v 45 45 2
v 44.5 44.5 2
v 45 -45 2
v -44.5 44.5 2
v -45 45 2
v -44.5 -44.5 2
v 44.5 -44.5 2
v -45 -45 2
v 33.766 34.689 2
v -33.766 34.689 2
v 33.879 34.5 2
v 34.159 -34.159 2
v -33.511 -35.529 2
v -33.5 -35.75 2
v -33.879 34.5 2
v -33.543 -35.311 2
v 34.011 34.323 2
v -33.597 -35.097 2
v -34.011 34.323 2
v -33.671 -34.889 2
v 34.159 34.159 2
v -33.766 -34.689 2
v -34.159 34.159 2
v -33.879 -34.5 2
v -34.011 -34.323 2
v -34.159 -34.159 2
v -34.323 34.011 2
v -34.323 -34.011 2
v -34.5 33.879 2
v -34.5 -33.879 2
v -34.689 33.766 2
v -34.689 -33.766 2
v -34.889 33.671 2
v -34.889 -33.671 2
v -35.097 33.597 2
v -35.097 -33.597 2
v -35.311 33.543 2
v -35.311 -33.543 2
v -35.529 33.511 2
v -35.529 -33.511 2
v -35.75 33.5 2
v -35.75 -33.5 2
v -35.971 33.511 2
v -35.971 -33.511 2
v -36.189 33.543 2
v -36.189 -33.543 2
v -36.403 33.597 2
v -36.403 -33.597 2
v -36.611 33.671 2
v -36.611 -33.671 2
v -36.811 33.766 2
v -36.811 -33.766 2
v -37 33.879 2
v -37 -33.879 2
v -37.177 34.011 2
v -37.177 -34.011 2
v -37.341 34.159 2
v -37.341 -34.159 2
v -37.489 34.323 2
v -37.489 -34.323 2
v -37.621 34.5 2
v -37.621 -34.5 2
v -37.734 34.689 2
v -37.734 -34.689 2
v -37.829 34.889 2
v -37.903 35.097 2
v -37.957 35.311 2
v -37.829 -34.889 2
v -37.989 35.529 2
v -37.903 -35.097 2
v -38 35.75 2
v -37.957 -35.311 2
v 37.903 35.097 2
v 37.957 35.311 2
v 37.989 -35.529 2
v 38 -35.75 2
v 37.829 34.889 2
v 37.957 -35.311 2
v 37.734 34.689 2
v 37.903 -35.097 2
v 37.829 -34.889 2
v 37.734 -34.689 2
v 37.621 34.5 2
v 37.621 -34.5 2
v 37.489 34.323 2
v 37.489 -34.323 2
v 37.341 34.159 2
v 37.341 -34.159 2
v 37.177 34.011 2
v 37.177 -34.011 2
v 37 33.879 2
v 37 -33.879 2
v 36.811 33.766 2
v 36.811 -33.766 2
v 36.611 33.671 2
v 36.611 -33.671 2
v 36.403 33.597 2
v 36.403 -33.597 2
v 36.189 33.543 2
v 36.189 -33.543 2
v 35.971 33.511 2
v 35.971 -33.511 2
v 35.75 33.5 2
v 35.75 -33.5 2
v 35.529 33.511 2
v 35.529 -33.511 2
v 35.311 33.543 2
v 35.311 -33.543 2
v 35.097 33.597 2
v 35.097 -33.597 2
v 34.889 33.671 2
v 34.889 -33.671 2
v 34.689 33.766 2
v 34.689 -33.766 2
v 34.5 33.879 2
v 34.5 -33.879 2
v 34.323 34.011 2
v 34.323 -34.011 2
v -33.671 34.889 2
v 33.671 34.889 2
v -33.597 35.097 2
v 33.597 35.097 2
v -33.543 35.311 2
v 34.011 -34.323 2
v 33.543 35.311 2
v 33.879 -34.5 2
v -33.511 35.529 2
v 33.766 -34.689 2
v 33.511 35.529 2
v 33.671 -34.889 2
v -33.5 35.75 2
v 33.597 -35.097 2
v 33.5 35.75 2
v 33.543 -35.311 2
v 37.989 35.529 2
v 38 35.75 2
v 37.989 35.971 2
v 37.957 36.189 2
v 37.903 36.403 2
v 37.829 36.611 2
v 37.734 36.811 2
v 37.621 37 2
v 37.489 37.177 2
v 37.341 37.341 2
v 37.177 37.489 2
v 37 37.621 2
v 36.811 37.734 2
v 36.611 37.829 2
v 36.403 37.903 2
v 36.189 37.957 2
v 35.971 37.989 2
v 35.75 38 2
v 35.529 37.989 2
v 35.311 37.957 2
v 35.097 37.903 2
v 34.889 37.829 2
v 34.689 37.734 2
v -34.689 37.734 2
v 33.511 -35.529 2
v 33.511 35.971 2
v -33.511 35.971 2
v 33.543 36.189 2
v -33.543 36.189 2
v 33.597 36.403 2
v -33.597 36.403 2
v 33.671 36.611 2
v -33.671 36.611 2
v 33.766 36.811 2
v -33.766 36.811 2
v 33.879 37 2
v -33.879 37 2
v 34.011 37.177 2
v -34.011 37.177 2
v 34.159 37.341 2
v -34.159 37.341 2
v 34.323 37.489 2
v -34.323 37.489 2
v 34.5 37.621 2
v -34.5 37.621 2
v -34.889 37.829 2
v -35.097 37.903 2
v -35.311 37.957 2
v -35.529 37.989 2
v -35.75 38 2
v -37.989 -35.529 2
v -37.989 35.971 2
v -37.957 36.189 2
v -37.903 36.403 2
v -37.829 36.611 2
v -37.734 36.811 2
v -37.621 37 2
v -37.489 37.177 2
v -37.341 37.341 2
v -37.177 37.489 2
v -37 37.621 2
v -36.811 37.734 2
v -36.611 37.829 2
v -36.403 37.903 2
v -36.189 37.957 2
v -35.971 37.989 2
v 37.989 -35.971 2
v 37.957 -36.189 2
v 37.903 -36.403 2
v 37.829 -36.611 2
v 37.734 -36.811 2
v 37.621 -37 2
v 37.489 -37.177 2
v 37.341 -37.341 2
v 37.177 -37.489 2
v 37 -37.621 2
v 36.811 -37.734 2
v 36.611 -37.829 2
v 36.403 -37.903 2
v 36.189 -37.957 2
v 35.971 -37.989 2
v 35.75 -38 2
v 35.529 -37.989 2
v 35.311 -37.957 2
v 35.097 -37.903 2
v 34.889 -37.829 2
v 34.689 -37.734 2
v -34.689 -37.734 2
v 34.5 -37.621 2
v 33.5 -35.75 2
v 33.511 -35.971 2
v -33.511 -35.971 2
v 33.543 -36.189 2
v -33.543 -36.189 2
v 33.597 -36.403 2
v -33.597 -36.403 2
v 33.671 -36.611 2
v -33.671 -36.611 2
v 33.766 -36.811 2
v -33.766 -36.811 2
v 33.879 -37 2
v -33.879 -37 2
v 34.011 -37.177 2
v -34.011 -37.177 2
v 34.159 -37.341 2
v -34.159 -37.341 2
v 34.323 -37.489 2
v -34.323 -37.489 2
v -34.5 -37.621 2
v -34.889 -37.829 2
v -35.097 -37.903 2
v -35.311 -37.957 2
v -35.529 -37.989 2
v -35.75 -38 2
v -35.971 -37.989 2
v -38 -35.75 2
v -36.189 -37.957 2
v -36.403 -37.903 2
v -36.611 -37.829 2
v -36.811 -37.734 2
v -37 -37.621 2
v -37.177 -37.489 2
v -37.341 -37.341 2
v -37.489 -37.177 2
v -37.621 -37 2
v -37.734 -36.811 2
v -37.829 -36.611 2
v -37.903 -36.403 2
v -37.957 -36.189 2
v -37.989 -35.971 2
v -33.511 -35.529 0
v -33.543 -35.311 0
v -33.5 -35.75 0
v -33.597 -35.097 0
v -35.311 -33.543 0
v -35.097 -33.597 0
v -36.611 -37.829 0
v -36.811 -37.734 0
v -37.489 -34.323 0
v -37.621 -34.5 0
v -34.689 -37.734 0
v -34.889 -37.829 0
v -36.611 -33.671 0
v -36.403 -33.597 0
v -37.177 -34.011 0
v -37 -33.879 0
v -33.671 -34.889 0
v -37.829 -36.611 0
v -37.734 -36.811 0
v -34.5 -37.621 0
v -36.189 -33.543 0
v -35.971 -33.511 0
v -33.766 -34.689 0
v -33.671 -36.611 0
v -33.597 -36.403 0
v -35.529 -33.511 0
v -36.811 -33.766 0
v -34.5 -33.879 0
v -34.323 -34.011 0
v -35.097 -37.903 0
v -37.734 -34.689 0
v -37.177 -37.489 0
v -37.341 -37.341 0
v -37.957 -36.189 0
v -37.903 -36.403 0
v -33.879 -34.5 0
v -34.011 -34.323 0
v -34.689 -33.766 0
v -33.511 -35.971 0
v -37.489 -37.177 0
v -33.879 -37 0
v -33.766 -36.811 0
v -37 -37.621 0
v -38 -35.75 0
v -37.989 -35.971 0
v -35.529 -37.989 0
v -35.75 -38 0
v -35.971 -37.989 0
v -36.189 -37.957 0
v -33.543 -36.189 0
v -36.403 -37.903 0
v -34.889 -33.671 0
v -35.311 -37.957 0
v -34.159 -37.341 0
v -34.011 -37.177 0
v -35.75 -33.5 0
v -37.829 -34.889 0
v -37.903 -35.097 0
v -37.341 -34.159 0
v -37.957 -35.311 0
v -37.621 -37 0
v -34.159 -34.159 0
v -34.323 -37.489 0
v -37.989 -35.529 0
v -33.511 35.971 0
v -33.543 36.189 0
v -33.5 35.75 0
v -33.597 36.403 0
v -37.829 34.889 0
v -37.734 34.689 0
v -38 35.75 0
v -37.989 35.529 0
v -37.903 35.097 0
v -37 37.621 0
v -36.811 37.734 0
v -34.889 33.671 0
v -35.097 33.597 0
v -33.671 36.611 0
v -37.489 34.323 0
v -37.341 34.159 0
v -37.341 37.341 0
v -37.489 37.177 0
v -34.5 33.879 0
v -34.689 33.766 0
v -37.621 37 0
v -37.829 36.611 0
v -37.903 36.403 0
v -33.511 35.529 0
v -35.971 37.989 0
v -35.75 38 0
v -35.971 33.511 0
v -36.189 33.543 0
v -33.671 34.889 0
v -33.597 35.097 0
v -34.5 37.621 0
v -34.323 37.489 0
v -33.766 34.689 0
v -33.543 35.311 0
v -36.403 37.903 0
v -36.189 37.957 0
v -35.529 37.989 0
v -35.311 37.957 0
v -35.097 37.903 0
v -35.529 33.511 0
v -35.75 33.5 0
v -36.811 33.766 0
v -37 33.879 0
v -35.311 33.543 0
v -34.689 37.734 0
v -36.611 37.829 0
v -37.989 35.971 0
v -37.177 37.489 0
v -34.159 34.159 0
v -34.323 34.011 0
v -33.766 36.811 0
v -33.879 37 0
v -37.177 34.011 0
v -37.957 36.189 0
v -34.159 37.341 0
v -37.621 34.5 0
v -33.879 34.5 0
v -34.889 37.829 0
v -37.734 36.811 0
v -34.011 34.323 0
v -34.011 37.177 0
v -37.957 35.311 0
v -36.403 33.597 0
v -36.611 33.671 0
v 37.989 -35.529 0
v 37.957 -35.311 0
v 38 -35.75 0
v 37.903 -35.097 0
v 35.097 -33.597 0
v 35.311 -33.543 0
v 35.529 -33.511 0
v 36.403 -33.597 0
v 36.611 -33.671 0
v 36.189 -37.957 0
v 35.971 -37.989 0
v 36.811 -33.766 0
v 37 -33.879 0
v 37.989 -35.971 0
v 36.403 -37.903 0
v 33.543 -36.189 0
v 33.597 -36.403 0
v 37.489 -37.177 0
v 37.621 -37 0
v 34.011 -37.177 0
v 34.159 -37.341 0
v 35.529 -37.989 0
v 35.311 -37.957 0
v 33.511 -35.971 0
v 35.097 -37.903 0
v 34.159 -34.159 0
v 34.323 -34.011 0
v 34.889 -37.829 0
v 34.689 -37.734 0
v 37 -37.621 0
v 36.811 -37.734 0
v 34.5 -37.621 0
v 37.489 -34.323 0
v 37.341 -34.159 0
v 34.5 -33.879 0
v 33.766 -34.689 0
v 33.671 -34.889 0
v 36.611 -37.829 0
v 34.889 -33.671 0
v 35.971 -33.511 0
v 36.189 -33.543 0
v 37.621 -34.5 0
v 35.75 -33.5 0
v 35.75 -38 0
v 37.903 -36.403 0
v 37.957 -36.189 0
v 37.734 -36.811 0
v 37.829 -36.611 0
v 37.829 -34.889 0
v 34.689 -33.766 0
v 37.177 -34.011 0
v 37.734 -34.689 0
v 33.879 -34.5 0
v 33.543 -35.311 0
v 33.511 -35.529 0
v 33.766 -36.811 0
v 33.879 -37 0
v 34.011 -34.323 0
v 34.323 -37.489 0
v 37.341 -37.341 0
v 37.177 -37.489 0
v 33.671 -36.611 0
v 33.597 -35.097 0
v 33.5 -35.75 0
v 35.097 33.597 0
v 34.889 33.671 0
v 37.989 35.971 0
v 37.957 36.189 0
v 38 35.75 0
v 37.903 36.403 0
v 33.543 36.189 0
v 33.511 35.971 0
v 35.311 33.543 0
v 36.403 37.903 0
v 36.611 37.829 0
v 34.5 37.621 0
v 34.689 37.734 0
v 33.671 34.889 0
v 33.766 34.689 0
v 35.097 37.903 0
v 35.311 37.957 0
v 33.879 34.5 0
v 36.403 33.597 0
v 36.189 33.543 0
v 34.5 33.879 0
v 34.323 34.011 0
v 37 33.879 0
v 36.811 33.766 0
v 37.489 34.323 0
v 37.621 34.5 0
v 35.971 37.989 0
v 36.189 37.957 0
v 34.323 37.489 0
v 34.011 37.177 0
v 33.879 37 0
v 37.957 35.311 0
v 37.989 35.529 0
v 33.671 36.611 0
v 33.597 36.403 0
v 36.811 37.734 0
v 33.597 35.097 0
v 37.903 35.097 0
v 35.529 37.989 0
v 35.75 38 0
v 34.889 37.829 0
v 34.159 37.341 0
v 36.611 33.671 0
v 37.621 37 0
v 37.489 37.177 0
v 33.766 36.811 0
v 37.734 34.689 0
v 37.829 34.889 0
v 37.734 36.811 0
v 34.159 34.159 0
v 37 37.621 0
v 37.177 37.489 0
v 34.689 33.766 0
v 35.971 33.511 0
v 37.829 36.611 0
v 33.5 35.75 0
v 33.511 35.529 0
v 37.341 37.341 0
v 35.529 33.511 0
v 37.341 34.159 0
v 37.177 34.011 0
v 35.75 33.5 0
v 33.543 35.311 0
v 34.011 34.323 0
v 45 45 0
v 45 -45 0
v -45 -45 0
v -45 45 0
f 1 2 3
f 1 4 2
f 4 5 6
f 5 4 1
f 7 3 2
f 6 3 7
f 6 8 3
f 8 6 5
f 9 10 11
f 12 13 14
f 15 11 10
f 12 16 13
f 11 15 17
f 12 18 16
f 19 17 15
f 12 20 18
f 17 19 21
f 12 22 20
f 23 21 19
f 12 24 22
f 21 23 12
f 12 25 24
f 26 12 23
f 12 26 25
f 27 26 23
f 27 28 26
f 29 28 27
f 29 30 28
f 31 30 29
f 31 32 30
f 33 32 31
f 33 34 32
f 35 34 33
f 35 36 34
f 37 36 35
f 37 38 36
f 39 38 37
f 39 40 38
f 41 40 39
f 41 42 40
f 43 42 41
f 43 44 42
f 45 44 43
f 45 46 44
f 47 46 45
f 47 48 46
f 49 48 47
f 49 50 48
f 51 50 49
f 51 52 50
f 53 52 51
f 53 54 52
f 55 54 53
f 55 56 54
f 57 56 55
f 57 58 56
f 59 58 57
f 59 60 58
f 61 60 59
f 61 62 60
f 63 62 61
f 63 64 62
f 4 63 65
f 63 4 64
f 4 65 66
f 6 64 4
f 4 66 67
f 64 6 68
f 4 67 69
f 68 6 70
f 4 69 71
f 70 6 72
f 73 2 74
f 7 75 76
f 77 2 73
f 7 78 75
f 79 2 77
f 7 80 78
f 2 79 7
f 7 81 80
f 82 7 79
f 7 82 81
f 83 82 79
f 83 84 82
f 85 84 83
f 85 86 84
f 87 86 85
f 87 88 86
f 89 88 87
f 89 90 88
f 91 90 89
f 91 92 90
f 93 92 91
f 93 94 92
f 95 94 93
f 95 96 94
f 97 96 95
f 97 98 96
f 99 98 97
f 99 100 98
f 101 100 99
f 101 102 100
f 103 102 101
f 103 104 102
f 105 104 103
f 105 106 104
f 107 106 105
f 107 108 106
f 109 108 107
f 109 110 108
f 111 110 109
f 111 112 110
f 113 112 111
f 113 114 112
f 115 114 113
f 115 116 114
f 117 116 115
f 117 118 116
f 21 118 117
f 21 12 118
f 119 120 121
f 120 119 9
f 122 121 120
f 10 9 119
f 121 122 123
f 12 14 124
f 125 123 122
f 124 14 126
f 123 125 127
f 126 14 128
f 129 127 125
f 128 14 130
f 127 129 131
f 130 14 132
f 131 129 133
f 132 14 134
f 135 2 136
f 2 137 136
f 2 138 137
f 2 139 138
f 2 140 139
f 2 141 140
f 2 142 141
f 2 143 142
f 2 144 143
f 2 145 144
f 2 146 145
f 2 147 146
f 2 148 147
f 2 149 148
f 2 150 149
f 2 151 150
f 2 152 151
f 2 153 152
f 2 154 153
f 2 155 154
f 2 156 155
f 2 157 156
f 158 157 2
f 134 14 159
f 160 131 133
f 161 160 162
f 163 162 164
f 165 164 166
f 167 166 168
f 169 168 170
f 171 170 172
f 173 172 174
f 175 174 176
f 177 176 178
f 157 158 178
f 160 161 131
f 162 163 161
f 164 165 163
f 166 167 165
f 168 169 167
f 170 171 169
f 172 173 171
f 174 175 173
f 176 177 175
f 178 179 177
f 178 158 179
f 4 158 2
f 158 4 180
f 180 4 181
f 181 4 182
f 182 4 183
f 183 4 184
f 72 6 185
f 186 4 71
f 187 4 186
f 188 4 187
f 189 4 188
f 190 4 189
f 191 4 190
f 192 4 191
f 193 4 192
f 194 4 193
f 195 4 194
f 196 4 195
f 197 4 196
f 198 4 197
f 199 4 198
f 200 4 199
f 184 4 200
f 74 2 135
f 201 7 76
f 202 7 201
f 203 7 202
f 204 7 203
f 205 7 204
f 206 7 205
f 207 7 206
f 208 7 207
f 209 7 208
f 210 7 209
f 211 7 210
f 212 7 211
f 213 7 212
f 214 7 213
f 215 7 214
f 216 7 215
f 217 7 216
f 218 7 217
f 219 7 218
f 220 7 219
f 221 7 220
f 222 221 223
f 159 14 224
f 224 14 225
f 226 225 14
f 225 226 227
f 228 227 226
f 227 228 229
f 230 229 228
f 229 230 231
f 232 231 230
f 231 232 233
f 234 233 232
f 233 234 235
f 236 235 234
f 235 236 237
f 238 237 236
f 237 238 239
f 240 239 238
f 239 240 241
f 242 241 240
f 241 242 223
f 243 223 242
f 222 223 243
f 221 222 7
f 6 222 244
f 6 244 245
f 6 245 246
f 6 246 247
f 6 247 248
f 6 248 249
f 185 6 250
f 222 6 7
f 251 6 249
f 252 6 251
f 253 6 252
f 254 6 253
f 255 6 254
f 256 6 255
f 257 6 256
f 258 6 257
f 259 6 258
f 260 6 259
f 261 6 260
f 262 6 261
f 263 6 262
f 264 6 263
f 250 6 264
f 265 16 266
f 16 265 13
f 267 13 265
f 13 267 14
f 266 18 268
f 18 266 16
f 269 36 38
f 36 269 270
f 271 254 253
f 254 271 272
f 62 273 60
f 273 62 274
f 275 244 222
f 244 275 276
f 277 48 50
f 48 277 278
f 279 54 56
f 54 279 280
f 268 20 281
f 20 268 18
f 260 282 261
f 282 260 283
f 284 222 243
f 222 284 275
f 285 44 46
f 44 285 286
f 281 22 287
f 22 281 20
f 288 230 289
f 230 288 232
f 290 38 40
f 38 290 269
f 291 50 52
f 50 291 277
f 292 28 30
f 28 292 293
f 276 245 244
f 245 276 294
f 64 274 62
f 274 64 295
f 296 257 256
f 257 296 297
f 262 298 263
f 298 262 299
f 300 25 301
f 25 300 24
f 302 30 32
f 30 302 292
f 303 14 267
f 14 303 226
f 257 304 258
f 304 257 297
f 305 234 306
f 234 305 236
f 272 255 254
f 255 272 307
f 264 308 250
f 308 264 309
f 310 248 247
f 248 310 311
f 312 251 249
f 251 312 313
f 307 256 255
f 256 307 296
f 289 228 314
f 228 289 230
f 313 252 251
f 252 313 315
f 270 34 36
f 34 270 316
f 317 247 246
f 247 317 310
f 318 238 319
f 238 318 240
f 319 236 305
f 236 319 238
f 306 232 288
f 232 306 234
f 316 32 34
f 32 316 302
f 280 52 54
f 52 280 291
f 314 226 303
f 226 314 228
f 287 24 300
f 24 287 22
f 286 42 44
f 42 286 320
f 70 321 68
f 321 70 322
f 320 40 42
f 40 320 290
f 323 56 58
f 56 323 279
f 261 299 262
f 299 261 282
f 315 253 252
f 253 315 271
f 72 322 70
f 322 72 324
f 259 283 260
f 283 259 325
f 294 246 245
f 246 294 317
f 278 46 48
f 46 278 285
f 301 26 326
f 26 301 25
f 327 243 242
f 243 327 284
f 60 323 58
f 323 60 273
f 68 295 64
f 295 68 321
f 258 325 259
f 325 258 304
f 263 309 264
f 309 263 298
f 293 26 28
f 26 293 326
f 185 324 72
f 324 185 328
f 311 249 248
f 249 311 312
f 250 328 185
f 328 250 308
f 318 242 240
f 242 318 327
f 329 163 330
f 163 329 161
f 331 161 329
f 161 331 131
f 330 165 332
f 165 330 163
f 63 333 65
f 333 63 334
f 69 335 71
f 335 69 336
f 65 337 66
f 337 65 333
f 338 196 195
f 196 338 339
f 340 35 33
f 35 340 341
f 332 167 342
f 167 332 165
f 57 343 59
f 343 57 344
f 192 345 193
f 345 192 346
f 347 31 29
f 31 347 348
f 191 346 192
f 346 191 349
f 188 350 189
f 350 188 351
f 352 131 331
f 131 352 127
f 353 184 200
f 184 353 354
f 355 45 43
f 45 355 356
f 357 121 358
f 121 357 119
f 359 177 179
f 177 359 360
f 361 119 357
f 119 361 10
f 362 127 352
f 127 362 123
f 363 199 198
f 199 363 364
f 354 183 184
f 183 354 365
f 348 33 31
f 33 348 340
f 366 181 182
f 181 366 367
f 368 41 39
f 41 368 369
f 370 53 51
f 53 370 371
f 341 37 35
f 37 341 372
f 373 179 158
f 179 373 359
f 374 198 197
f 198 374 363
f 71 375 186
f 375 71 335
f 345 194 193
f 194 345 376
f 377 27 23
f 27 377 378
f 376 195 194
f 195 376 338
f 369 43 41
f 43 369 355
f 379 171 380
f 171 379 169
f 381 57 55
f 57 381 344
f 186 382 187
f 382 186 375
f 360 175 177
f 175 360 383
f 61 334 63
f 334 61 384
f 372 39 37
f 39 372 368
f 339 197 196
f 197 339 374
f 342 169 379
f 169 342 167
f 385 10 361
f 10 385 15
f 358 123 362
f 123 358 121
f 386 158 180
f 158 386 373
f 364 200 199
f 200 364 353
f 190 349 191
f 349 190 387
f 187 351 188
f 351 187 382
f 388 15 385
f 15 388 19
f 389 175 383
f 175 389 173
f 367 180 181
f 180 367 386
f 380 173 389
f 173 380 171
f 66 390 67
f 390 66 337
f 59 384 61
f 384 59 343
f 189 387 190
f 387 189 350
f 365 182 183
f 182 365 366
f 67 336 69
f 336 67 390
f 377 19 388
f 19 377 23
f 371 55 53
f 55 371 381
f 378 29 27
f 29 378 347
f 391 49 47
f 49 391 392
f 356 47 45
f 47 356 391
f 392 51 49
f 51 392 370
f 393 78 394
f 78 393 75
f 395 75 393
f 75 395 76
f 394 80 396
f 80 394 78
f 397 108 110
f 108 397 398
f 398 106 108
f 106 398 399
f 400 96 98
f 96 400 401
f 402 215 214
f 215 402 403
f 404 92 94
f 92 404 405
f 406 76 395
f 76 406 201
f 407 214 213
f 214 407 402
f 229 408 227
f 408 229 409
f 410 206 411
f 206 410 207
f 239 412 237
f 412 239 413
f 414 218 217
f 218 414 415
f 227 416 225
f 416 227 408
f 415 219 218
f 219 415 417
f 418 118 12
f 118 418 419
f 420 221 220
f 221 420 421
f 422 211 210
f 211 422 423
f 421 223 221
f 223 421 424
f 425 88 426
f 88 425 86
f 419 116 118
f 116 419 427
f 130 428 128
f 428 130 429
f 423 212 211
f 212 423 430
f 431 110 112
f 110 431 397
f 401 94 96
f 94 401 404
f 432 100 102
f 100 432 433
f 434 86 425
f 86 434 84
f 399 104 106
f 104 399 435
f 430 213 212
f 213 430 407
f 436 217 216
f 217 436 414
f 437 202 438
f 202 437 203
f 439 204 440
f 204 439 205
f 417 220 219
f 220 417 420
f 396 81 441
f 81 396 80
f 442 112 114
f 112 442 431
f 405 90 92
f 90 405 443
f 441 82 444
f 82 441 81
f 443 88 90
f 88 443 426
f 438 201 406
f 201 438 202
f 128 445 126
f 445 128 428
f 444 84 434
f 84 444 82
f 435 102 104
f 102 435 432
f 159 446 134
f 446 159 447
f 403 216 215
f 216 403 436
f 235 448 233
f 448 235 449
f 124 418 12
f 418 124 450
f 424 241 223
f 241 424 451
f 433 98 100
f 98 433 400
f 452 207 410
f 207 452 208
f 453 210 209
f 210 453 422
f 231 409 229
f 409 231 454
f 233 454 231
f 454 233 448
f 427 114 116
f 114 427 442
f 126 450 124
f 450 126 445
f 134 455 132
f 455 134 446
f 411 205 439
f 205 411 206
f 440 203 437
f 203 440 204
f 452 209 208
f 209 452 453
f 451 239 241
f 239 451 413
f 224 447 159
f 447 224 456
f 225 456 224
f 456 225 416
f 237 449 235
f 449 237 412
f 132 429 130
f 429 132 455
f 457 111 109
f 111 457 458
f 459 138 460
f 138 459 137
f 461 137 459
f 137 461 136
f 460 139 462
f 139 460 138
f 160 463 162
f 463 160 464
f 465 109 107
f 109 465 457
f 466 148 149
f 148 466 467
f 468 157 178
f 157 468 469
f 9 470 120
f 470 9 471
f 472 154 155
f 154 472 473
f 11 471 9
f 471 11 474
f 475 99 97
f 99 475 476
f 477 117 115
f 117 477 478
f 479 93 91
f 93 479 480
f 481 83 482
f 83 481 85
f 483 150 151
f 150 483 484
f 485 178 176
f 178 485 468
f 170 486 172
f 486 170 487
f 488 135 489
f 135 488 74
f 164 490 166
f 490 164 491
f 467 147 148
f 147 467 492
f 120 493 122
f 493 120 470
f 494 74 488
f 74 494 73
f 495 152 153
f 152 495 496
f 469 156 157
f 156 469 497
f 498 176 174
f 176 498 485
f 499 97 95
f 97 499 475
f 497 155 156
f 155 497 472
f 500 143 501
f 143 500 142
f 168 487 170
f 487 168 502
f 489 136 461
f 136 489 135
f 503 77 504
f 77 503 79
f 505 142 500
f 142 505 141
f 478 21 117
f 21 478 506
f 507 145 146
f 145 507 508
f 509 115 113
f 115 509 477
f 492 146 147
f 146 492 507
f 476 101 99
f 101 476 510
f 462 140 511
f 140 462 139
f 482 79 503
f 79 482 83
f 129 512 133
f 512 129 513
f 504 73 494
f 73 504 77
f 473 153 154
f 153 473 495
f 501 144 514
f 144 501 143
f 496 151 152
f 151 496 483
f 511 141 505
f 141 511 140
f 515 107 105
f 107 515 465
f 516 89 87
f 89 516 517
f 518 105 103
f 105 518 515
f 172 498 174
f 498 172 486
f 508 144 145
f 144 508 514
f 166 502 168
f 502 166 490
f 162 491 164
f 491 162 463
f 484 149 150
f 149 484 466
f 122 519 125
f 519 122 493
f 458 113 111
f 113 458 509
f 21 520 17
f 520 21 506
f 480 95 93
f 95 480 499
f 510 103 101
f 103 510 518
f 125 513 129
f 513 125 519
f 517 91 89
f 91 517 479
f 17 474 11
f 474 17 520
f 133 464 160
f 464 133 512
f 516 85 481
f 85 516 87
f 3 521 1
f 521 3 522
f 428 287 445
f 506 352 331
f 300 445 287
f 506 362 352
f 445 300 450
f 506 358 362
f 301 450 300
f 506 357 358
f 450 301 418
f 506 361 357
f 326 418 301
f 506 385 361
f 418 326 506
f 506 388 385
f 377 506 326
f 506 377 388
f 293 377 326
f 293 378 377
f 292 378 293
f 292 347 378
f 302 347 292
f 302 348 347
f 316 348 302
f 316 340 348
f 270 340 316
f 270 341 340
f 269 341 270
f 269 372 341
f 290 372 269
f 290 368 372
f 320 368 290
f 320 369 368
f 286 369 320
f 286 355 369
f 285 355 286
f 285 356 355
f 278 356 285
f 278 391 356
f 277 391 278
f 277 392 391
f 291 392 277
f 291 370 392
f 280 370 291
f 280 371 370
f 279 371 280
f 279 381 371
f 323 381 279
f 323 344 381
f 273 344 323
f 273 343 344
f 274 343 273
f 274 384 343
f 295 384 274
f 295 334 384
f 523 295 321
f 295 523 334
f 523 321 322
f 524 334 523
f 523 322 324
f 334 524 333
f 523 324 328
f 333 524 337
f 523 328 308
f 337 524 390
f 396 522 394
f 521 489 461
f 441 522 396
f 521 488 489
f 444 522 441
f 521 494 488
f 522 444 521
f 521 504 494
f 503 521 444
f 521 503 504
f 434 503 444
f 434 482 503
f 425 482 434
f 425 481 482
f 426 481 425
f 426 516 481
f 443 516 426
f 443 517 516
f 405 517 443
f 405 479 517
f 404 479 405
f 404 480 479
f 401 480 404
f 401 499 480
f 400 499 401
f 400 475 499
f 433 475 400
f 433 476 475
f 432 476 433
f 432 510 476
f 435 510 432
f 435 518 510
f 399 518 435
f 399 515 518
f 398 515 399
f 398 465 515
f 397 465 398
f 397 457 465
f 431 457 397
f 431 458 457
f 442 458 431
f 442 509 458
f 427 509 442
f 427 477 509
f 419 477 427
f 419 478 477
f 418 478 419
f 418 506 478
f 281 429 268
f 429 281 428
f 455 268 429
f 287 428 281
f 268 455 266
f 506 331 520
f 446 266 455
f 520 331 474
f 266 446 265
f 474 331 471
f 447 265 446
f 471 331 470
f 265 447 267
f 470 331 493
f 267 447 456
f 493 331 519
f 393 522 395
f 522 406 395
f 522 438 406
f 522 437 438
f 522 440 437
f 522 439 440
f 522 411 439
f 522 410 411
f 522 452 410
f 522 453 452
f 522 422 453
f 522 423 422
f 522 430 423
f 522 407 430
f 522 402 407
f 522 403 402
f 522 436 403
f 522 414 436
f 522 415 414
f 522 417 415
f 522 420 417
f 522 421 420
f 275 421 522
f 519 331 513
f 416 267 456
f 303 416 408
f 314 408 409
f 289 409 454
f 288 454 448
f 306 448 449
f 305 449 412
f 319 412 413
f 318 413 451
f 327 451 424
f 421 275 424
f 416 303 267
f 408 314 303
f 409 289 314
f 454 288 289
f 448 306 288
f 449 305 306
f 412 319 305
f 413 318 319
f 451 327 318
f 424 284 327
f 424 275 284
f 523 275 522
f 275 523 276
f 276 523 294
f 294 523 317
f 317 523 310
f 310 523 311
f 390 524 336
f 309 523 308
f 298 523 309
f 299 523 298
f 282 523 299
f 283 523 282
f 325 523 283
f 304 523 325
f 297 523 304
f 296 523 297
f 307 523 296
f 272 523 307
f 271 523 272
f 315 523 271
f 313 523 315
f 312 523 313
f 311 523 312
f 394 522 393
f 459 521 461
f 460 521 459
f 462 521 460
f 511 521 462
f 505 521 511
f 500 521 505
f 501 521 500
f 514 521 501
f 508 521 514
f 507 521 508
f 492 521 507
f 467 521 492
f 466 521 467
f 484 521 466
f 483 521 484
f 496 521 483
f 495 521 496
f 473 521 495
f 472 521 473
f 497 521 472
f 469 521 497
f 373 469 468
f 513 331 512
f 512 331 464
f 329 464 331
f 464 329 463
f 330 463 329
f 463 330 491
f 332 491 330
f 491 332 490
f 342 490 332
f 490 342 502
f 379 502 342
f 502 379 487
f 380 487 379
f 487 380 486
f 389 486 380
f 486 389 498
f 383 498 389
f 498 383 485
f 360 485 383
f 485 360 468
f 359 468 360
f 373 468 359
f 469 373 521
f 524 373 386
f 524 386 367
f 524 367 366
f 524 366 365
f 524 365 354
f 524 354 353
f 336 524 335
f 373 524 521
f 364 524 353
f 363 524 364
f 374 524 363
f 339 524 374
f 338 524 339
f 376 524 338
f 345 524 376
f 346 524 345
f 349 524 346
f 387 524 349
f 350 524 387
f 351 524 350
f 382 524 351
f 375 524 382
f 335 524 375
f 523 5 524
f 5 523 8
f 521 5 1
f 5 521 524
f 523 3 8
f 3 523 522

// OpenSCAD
// DIY magnetic stirrer housing - upside-down open box over 80 mm PC fan
// Print orientation: top plate on bed (z = 0), walls rise to open top (z = 40)

// ---------- Parameters ----------
plate_t      = 2;     // top plate thickness
wall_t       = 2.5;   // wall thickness
box_h        = 40;    // total height (open top at z = 40)
outer_x      = 90;    // outer size in X
outer_y      = 90;    // outer size in Y
screw_d      = 4.5;   // M4 screw hole diameter
screw_pitch  = 71.5;  // square pattern side length (hole centre to hole centre)
notch_w      = 12;    // cable notch width
notch_d      = 8;     // cable notch depth from open edge
eps          = 0.5;   // cutter overshoot past faces

$fn = 64;

// ---------- Model ----------
difference() {
    // Closed top plate
    translate([-outer_x/2, -outer_y/2, 0])
        cube([outer_x, outer_y, plate_t]);

    // Four walls, open top, with overshoot above the open edge
    for (a = [0, 90, 180, 270])
        rotate([0, 0, a])
            translate([outer_x/2 - eps, -outer_y/2, plate_t])
                cube([eps, outer_y, box_h + eps]);

    // Screw holes through the top plate, centred on the plate
    for (i = [0 : 3]) {
        for (j = [0 : 3]) {
            x = (i - 1.5) * screw_pitch;
            y = (j - 1.5) * screw_pitch;
            translate([x, y, -eps])
                cylinder(d = screw_d, h = plate_t + 2*eps);
        }
    }

    // Cable notch in one wall: 12 mm wide, centred along the wall,
    // reaching 8 mm down from the open edge (z = 32 to z = 40)
    translate([outer_x/2 - notch_w/2, 0, plate_t + notch_d])
        cube([notch_w, outer_y, notch_d + eps]);
}
